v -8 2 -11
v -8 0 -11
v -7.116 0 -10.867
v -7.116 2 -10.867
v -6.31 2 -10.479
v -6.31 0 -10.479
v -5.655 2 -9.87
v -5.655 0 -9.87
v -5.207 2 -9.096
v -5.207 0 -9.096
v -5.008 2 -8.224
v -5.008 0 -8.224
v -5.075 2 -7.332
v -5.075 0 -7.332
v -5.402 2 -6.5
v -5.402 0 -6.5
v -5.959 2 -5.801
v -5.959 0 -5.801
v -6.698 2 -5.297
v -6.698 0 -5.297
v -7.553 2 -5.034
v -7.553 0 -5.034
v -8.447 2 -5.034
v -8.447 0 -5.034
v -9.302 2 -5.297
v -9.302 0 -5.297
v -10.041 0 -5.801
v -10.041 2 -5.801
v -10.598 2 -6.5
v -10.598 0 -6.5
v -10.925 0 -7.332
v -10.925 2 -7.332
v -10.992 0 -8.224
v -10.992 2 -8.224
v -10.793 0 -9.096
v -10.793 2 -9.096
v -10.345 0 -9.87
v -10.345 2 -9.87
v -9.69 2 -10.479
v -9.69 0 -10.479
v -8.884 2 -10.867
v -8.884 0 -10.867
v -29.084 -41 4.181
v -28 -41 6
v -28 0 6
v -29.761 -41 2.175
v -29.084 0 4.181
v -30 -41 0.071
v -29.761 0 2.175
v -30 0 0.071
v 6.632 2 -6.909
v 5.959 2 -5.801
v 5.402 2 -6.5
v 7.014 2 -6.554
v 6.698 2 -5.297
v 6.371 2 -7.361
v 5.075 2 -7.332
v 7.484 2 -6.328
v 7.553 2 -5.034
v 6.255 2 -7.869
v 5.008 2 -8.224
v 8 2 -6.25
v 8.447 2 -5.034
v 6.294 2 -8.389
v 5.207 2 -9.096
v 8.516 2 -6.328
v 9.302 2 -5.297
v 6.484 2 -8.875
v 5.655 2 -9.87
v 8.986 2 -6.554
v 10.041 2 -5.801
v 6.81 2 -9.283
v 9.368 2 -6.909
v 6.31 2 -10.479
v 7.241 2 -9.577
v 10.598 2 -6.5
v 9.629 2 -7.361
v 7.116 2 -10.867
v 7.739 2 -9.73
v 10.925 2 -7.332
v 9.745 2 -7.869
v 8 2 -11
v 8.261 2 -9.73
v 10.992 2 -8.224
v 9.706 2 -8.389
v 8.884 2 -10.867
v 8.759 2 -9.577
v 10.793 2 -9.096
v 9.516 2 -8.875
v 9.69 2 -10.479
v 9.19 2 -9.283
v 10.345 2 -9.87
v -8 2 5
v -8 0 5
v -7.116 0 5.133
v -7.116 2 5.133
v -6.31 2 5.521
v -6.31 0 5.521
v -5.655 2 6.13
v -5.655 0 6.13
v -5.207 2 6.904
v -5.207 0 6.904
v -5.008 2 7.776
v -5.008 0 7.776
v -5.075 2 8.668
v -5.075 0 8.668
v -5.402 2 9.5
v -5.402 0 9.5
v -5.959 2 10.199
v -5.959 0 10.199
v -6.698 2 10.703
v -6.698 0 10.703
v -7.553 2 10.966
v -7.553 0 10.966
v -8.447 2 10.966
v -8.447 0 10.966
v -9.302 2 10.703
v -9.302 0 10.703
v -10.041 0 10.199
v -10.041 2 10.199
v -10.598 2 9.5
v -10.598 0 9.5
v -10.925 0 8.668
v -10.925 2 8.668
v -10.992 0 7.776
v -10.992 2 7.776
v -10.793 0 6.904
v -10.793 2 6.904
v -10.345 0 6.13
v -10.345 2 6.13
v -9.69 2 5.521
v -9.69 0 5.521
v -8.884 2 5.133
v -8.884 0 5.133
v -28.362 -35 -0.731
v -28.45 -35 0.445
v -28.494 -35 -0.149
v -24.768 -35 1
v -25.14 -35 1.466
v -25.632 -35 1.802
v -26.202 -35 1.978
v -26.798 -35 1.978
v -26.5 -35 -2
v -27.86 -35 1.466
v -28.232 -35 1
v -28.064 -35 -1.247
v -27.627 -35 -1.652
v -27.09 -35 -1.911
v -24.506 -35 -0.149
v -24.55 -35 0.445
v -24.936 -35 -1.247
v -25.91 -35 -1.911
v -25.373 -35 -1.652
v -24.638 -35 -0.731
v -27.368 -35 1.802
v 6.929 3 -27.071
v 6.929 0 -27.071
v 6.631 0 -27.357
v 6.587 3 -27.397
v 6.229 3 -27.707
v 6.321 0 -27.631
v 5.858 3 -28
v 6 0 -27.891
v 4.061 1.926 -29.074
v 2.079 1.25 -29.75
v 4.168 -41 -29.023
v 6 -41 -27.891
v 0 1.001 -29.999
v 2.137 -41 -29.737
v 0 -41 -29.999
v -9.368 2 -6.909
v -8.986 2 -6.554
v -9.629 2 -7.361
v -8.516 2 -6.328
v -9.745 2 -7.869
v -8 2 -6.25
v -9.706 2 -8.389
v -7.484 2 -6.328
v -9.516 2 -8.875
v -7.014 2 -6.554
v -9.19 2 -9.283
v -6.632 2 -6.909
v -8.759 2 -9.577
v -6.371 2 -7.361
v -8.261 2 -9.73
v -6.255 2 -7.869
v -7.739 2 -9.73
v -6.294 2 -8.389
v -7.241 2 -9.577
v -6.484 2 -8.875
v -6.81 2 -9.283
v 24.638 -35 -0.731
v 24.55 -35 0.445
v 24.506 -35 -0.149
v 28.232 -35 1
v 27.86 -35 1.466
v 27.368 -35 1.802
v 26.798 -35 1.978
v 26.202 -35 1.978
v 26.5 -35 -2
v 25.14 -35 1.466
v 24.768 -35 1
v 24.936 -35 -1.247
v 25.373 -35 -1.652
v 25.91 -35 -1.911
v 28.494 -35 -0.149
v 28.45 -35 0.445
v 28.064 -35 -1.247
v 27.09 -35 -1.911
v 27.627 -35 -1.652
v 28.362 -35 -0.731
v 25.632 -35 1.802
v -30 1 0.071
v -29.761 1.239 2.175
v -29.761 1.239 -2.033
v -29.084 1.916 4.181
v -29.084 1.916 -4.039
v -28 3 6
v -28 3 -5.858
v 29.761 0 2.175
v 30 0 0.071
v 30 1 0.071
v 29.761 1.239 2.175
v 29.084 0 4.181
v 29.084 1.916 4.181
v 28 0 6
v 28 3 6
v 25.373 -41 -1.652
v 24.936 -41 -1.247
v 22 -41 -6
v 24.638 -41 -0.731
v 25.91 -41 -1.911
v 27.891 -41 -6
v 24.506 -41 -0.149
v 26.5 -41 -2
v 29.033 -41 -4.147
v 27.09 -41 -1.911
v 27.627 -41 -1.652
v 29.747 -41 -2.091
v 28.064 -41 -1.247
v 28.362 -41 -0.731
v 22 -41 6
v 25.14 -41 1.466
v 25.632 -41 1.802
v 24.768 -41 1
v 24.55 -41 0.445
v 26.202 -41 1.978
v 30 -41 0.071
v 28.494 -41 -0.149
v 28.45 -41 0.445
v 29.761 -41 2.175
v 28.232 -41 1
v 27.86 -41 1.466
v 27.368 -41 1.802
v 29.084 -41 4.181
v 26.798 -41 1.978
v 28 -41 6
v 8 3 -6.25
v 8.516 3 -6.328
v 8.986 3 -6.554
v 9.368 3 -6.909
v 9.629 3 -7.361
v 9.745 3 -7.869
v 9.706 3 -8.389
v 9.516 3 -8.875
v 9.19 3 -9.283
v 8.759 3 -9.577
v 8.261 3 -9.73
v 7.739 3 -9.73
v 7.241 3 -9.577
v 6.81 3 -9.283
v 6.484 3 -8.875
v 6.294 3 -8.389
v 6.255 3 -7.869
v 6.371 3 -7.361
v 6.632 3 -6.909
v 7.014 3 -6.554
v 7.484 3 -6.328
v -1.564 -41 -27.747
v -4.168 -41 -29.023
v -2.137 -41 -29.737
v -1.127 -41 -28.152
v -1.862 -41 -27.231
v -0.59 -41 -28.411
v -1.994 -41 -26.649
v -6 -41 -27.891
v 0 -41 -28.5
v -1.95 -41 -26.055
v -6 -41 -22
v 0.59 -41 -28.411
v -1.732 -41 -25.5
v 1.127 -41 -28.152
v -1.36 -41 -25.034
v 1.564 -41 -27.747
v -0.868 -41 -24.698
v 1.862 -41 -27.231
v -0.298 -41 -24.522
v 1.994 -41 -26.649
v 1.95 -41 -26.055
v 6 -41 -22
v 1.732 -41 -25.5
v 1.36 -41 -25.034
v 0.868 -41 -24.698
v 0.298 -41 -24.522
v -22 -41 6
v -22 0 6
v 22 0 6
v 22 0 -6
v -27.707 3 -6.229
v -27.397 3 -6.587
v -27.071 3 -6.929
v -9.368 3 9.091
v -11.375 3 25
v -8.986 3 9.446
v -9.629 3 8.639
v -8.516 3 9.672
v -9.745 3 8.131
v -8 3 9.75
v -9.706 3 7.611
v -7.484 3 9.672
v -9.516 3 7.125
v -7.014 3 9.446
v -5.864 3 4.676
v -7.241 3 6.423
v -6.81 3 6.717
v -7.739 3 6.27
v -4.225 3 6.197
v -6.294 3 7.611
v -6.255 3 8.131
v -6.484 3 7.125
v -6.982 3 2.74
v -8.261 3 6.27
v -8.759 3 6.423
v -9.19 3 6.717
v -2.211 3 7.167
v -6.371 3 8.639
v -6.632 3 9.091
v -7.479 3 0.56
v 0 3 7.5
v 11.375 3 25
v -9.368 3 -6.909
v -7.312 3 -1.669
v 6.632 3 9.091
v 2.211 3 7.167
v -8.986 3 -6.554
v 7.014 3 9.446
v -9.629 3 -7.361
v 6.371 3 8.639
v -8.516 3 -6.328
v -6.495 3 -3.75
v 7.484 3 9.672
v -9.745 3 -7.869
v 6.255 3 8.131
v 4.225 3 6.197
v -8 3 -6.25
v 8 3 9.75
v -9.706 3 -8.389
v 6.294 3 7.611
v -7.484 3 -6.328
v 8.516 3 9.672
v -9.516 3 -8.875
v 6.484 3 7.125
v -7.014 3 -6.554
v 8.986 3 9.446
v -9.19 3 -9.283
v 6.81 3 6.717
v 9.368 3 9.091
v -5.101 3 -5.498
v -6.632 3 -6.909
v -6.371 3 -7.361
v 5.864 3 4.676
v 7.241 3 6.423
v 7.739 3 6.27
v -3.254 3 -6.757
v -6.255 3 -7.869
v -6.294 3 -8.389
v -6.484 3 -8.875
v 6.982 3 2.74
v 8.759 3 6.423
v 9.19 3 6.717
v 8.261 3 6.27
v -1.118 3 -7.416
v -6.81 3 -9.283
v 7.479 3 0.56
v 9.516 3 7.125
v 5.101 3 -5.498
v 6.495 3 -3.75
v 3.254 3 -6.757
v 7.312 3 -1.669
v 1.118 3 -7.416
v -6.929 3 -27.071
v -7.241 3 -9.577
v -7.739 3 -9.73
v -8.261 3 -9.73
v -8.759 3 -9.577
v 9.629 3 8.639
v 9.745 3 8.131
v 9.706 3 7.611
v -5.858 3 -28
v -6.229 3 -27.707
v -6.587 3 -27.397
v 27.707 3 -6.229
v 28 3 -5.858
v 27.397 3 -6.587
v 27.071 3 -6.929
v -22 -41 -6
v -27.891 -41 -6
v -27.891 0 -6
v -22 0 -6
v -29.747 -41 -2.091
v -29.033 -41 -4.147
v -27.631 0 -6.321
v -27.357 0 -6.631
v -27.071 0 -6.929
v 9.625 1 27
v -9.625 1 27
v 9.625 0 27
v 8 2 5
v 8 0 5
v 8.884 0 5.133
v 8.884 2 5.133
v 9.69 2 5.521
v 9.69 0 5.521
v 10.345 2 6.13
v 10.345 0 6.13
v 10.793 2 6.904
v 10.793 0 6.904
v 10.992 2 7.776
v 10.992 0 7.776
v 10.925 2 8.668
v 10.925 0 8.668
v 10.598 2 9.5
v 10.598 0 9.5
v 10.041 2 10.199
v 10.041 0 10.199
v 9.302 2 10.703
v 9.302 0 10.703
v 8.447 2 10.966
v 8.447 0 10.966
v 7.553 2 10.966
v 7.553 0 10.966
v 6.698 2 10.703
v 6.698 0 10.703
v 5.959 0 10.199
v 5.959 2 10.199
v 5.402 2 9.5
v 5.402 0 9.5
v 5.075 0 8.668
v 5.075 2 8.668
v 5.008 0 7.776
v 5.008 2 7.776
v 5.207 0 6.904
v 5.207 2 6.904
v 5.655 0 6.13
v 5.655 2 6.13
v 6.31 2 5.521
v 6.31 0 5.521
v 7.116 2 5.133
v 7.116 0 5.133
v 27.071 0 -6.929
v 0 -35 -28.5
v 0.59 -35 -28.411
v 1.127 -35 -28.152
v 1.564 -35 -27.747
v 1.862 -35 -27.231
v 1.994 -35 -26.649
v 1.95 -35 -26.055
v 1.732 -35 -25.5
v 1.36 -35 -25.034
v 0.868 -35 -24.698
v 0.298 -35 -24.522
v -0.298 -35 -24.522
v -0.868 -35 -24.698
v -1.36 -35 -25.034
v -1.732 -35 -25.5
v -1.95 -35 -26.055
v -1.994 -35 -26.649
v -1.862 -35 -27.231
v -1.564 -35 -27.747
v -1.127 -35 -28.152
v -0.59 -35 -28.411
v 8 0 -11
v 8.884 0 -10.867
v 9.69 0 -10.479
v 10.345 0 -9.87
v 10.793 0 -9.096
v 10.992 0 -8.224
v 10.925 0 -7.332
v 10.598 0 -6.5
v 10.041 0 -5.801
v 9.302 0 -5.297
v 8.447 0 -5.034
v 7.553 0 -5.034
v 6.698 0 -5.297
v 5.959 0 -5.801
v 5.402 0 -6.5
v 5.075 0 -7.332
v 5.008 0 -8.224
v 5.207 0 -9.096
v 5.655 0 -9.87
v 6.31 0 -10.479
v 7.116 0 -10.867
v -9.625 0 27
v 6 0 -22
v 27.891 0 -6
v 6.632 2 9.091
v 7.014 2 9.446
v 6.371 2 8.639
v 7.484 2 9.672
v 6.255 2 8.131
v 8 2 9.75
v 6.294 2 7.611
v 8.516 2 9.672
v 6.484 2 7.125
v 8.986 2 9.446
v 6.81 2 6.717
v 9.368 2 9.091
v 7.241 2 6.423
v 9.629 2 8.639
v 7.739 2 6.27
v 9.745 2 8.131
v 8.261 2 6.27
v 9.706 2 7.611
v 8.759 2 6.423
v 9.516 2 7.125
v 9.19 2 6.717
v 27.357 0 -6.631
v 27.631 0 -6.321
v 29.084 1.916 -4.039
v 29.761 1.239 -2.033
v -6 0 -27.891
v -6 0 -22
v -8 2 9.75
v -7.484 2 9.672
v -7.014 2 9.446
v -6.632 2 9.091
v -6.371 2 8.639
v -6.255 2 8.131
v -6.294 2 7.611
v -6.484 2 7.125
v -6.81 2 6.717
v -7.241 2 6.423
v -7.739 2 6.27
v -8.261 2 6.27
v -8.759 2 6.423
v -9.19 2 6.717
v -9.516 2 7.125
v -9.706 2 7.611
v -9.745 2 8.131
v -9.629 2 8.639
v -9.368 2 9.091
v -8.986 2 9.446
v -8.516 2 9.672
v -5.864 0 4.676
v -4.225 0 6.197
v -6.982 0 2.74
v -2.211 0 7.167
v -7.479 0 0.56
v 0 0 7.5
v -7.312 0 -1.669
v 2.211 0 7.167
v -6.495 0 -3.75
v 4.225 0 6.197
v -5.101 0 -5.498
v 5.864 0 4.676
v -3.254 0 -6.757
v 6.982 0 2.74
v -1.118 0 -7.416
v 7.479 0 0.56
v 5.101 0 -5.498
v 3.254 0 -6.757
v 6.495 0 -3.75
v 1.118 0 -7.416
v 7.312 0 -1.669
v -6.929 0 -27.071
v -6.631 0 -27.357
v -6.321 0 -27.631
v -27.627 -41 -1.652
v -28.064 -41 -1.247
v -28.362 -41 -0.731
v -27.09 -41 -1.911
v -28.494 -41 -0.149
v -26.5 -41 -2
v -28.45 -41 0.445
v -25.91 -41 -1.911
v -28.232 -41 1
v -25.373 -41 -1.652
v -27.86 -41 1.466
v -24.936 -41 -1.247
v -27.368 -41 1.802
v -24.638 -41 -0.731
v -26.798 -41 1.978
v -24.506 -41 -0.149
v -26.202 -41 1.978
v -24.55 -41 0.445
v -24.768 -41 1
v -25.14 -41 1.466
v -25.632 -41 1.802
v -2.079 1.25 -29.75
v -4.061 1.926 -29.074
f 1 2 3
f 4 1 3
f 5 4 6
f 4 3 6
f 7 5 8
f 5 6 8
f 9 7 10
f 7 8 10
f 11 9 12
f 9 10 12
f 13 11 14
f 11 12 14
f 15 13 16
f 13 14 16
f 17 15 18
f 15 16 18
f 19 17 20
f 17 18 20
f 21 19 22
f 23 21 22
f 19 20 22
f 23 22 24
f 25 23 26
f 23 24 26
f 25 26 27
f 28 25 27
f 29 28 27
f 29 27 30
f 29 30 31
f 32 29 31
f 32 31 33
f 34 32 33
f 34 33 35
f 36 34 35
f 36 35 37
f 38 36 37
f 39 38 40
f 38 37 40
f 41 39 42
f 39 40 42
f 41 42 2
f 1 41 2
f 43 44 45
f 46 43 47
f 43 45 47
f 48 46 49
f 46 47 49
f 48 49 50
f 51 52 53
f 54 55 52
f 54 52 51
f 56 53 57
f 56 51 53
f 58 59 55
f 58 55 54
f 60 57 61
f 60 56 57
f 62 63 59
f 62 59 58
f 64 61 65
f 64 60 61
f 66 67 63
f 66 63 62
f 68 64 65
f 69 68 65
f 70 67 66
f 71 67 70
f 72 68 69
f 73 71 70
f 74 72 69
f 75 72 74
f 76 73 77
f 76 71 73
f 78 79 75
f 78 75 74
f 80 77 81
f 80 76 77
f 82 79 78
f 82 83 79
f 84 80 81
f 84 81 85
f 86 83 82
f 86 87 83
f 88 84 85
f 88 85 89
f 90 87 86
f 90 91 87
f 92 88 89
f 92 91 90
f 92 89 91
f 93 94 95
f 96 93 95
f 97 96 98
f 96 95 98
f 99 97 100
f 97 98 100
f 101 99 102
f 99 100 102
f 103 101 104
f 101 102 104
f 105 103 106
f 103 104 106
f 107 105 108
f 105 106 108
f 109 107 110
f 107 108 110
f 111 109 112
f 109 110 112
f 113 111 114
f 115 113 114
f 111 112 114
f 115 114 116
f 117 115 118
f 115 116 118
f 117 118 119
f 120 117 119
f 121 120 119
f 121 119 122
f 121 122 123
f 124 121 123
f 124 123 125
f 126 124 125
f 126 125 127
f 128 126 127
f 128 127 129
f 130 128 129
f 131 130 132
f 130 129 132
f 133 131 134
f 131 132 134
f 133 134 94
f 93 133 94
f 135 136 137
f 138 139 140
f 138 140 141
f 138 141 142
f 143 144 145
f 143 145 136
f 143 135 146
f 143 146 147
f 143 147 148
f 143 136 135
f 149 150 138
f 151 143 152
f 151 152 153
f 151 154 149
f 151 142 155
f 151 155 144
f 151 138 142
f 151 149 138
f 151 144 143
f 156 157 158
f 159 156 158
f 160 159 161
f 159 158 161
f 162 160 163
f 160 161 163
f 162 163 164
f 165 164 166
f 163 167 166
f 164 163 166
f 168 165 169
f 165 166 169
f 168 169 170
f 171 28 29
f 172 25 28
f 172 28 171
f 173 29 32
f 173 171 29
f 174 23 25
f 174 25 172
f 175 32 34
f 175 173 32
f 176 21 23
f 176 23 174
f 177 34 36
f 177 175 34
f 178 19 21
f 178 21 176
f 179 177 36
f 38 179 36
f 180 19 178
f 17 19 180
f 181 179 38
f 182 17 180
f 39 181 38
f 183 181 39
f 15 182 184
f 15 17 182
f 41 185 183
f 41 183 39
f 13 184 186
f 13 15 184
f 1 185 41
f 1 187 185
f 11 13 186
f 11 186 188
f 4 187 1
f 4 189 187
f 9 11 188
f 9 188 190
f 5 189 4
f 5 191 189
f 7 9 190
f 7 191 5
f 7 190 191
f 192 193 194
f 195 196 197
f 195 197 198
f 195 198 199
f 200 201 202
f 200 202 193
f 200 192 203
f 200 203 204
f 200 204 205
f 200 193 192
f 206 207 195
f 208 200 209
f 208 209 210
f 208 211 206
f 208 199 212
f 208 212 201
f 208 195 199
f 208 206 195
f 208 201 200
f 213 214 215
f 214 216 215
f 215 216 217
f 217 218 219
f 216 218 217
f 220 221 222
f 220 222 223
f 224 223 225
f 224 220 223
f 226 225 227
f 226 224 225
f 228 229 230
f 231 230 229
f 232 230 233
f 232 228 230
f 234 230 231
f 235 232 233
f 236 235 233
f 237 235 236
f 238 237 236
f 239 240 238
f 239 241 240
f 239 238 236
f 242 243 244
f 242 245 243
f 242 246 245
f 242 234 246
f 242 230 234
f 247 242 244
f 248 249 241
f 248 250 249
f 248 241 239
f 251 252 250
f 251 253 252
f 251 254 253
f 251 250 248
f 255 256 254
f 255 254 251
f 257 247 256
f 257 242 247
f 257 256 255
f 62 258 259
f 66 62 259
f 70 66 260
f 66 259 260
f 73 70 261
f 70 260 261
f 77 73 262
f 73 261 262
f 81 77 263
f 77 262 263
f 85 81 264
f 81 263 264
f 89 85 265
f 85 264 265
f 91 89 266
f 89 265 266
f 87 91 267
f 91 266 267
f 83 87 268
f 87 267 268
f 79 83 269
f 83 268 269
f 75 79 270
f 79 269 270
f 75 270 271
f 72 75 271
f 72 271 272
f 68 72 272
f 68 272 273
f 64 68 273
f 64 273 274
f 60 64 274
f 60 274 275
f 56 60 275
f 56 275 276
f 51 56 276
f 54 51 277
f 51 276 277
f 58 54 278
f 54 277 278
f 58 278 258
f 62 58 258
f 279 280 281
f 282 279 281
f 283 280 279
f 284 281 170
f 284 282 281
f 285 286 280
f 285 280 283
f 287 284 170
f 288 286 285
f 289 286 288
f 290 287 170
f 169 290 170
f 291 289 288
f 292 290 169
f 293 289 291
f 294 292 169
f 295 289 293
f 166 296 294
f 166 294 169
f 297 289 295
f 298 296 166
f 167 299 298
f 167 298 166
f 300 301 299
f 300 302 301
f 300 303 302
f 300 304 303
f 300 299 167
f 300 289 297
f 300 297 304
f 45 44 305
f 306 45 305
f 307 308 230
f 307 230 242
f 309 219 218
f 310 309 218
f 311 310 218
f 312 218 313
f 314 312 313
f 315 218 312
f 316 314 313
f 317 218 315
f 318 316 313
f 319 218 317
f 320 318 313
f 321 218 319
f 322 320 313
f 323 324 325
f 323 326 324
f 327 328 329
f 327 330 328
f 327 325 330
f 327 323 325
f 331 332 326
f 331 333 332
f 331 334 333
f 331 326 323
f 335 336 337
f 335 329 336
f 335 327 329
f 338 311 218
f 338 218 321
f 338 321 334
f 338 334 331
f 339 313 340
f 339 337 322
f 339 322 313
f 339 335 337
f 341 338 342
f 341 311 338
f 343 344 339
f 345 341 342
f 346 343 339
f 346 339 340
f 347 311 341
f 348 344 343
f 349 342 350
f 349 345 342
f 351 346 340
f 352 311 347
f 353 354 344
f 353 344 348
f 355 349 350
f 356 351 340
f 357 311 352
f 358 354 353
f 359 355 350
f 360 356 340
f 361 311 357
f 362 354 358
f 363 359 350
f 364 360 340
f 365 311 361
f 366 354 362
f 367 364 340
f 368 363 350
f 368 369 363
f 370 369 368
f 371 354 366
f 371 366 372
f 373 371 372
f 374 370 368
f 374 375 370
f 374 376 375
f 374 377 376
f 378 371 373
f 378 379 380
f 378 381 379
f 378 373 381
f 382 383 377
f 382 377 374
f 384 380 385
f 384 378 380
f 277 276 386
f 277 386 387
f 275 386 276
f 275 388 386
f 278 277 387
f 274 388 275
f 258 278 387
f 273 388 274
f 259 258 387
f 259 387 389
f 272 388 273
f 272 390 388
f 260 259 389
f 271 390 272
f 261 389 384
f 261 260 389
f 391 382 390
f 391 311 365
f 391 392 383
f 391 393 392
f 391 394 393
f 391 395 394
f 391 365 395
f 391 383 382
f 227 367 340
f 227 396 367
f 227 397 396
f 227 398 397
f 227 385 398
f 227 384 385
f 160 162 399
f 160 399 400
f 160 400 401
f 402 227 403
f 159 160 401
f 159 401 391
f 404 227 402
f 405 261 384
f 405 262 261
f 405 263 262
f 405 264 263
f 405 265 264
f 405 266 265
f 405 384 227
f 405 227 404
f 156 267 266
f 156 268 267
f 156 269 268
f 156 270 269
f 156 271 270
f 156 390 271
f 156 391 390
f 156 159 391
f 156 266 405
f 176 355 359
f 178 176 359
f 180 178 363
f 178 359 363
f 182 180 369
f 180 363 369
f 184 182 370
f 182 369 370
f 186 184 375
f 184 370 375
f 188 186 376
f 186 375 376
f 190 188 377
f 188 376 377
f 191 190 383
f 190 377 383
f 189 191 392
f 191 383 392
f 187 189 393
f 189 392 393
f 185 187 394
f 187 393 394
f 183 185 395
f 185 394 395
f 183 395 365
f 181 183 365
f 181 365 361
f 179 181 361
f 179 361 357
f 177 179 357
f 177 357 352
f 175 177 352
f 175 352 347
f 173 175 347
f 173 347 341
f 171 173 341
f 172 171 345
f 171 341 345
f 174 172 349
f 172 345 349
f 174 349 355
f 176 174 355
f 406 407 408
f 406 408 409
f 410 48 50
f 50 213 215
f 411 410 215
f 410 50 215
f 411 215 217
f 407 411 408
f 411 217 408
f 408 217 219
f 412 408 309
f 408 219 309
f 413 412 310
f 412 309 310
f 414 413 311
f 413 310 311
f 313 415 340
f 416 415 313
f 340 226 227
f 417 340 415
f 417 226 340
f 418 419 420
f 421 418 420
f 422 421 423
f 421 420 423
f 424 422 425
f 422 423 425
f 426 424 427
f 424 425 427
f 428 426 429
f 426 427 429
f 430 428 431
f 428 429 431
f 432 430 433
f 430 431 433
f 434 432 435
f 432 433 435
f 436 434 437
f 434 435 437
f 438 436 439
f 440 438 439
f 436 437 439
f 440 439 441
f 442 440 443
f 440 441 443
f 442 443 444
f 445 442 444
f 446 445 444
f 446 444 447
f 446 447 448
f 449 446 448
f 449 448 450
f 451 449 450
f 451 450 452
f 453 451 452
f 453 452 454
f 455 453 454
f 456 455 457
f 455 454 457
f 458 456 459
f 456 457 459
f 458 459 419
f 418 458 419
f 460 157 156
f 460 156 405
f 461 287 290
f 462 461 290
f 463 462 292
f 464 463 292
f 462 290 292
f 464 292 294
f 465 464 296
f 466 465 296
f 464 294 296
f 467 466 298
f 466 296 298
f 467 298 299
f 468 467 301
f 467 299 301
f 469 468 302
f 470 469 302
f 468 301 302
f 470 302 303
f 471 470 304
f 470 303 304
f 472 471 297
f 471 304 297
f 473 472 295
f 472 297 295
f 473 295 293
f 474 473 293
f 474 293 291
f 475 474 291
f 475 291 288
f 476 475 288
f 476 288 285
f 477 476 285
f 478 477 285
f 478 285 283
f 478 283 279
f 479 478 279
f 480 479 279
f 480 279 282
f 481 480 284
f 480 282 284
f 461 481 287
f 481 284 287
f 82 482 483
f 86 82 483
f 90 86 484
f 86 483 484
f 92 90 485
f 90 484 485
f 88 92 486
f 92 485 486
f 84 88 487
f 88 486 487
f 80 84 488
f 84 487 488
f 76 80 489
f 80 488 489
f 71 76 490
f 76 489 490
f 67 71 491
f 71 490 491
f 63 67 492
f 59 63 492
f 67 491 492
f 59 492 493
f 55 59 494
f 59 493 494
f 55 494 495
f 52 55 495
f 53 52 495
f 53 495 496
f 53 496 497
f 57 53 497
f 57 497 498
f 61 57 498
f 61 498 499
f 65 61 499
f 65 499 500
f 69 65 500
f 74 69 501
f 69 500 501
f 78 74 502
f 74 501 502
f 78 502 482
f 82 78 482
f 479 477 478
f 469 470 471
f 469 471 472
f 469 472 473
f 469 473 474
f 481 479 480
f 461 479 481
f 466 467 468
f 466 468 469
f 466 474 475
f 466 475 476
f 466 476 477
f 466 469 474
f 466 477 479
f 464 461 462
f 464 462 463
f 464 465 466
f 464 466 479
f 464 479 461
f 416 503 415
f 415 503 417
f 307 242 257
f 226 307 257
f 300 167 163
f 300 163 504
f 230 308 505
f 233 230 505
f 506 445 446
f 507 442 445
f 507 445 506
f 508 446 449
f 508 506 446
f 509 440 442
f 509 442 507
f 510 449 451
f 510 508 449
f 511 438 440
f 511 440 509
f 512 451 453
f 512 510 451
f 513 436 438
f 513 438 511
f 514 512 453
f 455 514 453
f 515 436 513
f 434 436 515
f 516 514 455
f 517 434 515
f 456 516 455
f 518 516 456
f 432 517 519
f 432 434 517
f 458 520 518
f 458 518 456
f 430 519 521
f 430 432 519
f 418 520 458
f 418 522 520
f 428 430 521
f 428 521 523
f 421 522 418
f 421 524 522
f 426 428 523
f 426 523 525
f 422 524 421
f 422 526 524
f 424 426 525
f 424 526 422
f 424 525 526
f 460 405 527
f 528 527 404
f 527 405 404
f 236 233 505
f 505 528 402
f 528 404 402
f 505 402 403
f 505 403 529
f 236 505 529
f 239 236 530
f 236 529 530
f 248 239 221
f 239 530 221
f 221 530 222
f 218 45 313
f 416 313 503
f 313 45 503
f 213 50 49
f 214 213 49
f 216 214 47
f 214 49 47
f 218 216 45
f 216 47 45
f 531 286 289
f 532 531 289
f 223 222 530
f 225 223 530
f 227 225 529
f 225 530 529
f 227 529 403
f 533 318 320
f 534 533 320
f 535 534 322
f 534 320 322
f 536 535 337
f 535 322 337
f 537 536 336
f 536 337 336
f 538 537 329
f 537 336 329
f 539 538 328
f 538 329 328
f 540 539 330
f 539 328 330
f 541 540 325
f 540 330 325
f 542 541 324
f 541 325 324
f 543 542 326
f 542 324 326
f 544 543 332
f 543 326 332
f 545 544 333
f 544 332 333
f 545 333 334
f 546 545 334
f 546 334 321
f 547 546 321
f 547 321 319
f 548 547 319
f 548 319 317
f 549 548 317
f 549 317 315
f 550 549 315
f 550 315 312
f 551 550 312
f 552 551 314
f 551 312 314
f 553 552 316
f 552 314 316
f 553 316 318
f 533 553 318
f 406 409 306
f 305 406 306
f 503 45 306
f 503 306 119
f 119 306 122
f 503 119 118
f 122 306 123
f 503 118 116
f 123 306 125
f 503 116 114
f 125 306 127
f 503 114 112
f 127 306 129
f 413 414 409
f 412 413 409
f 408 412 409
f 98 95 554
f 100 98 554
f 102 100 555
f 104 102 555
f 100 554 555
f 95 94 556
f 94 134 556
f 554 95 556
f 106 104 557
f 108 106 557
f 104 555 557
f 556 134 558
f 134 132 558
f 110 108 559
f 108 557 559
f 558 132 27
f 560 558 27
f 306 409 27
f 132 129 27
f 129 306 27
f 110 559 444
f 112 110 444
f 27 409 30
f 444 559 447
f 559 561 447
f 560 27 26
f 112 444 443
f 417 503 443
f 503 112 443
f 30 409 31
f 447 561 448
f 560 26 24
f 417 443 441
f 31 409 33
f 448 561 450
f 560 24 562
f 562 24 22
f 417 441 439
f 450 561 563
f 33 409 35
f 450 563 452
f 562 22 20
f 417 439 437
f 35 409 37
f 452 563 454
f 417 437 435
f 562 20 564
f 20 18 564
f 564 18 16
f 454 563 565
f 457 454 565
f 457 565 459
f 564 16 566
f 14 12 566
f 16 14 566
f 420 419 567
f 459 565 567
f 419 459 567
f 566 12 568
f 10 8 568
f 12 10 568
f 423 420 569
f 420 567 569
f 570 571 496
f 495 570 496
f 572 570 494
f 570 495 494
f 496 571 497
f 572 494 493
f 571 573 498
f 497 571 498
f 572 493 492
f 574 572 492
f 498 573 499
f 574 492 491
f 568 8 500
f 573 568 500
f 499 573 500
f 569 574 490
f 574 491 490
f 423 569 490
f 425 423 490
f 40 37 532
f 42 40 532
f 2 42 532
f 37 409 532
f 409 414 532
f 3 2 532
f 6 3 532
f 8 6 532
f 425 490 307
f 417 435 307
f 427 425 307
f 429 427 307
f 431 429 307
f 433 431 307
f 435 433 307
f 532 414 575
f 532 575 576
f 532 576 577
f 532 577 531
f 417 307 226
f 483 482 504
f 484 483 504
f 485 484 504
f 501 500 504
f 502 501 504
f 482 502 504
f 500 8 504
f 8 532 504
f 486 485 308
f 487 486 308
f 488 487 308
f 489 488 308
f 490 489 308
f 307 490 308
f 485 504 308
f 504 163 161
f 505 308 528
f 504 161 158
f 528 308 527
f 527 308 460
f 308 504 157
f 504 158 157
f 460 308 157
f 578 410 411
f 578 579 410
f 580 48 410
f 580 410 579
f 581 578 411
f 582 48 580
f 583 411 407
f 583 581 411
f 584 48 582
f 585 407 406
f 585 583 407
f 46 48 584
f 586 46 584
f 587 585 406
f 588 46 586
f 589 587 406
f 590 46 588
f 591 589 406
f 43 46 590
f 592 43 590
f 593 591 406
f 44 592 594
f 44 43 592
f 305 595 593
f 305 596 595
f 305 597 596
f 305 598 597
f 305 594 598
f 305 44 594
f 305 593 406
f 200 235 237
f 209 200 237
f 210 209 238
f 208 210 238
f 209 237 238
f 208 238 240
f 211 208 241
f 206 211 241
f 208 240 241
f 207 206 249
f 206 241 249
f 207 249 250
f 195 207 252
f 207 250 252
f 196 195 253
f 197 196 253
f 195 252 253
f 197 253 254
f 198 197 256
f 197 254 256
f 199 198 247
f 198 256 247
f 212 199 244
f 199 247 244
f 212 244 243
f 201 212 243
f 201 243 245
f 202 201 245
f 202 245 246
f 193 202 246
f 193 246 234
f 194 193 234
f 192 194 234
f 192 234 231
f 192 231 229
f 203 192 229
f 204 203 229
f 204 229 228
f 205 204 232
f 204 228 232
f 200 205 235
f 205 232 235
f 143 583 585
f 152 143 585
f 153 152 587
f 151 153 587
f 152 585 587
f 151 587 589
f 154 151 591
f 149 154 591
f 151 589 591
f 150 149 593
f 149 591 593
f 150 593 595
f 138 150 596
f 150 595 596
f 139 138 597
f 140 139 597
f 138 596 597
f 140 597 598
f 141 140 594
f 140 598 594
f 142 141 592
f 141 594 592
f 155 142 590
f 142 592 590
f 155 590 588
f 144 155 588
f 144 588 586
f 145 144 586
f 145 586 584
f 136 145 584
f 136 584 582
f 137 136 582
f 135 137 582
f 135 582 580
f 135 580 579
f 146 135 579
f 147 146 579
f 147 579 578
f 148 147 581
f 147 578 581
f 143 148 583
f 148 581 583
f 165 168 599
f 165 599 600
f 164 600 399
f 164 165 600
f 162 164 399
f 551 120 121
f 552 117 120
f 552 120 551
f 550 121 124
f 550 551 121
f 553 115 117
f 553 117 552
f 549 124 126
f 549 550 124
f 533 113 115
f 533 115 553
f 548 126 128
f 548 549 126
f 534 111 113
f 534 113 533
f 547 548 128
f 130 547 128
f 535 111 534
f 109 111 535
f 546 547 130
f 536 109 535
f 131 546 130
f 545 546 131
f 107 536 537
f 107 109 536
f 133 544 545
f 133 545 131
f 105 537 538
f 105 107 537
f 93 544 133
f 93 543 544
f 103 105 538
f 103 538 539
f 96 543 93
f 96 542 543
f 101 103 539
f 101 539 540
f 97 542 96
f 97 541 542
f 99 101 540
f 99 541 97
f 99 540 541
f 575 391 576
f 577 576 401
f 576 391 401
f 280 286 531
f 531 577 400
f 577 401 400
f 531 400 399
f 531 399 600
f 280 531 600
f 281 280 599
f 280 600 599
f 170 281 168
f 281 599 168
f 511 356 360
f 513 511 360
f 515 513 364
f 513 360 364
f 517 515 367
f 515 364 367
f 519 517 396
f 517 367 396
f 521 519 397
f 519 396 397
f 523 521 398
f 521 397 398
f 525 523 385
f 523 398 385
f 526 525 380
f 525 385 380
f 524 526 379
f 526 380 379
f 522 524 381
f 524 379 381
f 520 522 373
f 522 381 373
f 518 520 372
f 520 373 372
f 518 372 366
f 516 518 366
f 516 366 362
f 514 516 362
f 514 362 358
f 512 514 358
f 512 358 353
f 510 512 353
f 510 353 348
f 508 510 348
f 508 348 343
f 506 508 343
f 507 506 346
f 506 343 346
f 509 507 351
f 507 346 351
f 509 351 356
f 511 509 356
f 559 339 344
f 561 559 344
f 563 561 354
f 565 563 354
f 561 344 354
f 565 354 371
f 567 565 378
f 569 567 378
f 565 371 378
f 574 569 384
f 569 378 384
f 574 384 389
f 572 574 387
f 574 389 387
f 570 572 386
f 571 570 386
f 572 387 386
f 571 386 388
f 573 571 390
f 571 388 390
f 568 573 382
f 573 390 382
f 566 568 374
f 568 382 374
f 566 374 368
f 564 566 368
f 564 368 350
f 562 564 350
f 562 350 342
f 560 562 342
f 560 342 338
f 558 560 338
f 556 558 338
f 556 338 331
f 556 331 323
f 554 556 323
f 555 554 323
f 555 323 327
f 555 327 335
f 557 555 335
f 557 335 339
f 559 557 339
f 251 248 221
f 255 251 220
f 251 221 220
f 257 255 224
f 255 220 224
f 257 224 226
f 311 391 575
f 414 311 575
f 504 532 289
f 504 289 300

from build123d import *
from build123d.topology import SkipClean

# Parameters (mm, degrees)
SKETCH1_W           = 60
SKETCH1_H           = 60
BOSS_EXTRUDE1_DEPTH = 3
SKETCH4_W           = 8
SKETCH4_H           = 12
SKETCH4_W_2         = 12
SKETCH4_H_2         = 8
BOSS_EXTRUDE3_DEPTH = 41
SKETCH5_R           = 2
CUT_EXTRUDE2_DEPTH  = 6
SKETCH8_R           = 7.5
CUT_EXTRUDE4_DEPTH  = 6
CUT_EXTRUDE5_DEPTH  = 6
CUT_EXTRUDE6_DEPTH  = 6
SKETCH11_W          = 23.25
SKETCH11_H          = 3
CUT_EXTRUDE7_DEPTH  = 6
SKETCH12_R          = 3
CUT_EXTRUDE8_DEPTH  = 2
SKETCH13_R          = 1.75
CUT_EXTRUDE9_DEPTH  = 1
CHAMFER1_SIZE       = 2
CHAMFER2_SIZE       = 2
CHAMFER3_SIZE       = 2
CUT_EXTRUDE10_DEPTH = 10
FILLET1_R           = 10
CUT_EXTRUDE11_DEPTH = 59.999486357


with BuildPart() as part:
    # Sketch1 → Boss-Extrude1 (new body)
    with BuildSketch(Plane(origin=(0, 0, 0), x_dir=(1, 0, 0), z_dir=(0, 1, 0))):
        Rectangle(SKETCH1_W, SKETCH1_H)
    extrude(amount=BOSS_EXTRUDE1_DEPTH)

    # Sketch4 → Boss-Extrude3 (add)
    with BuildSketch(Plane.XZ):
        with Locations((-26, 0)):
            Rectangle(SKETCH4_W, SKETCH4_H)
        with Locations((0, -26)):
            Rectangle(SKETCH4_W_2, SKETCH4_H_2)
        with Locations((26, 0)):
            Rectangle(SKETCH4_W, SKETCH4_H)
    extrude(amount=BOSS_EXTRUDE3_DEPTH)

    # Sketch5 → Cut-Extrude2 (cut)
    with BuildSketch(Plane.XZ.offset(41)):
        with Locations(Location((0, -26.5, 0), (0, 0, 270))):
            Circle(SKETCH5_R)
        with Locations(Location((-26.5, 0, 0), (0, 0, 270))):
            Circle(SKETCH5_R)
        with Locations(Location((26.5, 0, 0), (0, 0, 270))):
            Circle(SKETCH5_R)
    extrude(amount=-CUT_EXTRUDE2_DEPTH, mode=Mode.SUBTRACT)

    # Sketch8 → Cut-Extrude4 (cut)
    with BuildSketch(Plane(origin=(0, 3, 0), x_dir=(1, 0, 0), z_dir=(0, 1, 0))):
        with Locations(Location((0, 0, 0), (0, 0, 270))):
            Circle(SKETCH8_R)
    extrude(amount=-CUT_EXTRUDE4_DEPTH, mode=Mode.SUBTRACT)

    # Sketch7 → Cut-Extrude5 (cut)
    with BuildSketch(Plane.XZ):
        Polygon((-30, -6), (-6, -30), (-30, -30), align=None)
        Polygon((30, -6), (6, -30), (30, -30), align=None)
    extrude(amount=-CUT_EXTRUDE5_DEPTH, mode=Mode.SUBTRACT)

    # Sketch10 → Cut-Extrude6 (cut)
    with BuildSketch(Plane.XZ):
        Polygon((-9, 30), (-30, 6), (-30, 30), align=None)
        Polygon((9, 30), (30, 6), (30, 30), align=None)
    extrude(amount=-CUT_EXTRUDE6_DEPTH, mode=Mode.SUBTRACT)

    # Sketch11 → Cut-Extrude7 (cut)
    with BuildSketch(Plane.XZ):
        with Locations((0, 28.5)):
            Rectangle(SKETCH11_W, SKETCH11_H)
    extrude(amount=-CUT_EXTRUDE7_DEPTH, mode=Mode.SUBTRACT)

    # Sketch12 → Cut-Extrude8 (cut)
    with BuildSketch(Plane.XZ):
        with Locations(Location((-8, 8, 0), (0, 0, 270))):
            Circle(SKETCH12_R)
        with Locations(Location((8, 8, 0), (0, 0, 270))):
            Circle(SKETCH12_R)
        with Locations(Location((8, -8, 0), (0, 0, 270))):
            Circle(SKETCH12_R)
        with Locations(Location((-8, -8, 0), (0, 0, 270))):
            Circle(SKETCH12_R)
    extrude(amount=-CUT_EXTRUDE8_DEPTH, mode=Mode.SUBTRACT)

    # Sketch13 → Cut-Extrude9 (cut)
    with BuildSketch(Plane(origin=(0, 3, 0), x_dir=(1, 0, 0), z_dir=(0, 1, 0))):
        with Locations(Location((-8, 8, 0), (0, 0, 270))):
            Circle(SKETCH13_R)
        with Locations(Location((8, 8, 0), (0, 0, 270))):
            Circle(SKETCH13_R)
        with Locations(Location((8, -8, 0), (0, 0, 270))):
            Circle(SKETCH13_R)
        with Locations(Location((-8, -8, 0), (0, 0, 270))):
            Circle(SKETCH13_R)
    extrude(amount=-CUT_EXTRUDE9_DEPTH, mode=Mode.SUBTRACT)

    # Chamfer1
    chamfer1_edges = [part.edges().sort_by_distance(p)[0] for p in [
        (30, 3, 0),
        (0, 3, -30),
        (-30, 3, 0),
    ]]
    chamfer(chamfer1_edges, length=CHAMFER1_SIZE)

    # Chamfer2
    chamfer2_edges = [part.edges().sort_by_distance(p)[0] for p in [
        (0, 3, 27),
    ]]
    chamfer(chamfer2_edges, length=CHAMFER2_SIZE)

    # Chamfer3
    chamfer3_edges = [part.edges().sort_by_distance(p)[0] for p in [
        (6, -20.5, -30),
        (-6, -20.5, -30),
        (-30, -20.5, -6),
        (-30, -20.5, 6),
        (30, -20.5, 6),
        (30, -20.5, -6),
    ]]
    chamfer(chamfer3_edges, length=CHAMFER3_SIZE)

    # Sketch14 → Cut-Extrude10 (cut)
    with BuildSketch(Plane.XZ):
        Polygon((-30, -4), (-4, -30), (-6, -30), (-30, -6), align=None)
        Polygon((4, -30), (30, -4), (30, -6), (6, -30), align=None)
    extrude(amount=-CUT_EXTRUDE10_DEPTH, mode=Mode.SUBTRACT)

    # Fillet1
    # the kernel refuses this fillet: 10 mm, written as the material it takes off along each edge
    with BuildSketch(Plane(origin=(-4, 11.355339059, -30), x_dir=(1, 0, 0), z_dir=(0, -1, 0)), Plane(origin=(4, -51.355339059, -30), x_dir=(-1, 0, 0), z_dir=(0, 1, 0)), Plane(origin=(30, 11.355339059, -4), x_dir=(0, 0, 1), z_dir=(0, -1, 0))) as fillet1_piece_1:
        with BuildLine():
            CenterArc((FILLET1_R * 0.414213562373, FILLET1_R), FILLET1_R, 225, 45)
            Line((-FILLET1_R * 0.292893218813, FILLET1_R * 0.292893218813), (0, 0))
            Line((0, 0), (FILLET1_R * 0.414213562373, 0))
        make_face()
    extrude(amount=62.710678119, mode=Mode.SUBTRACT)
    with BuildSketch(Plane(origin=(-30, 0, 4), x_dir=(0, 0, -1), z_dir=(0, -1, 0))) as fillet1_piece_2:
        with BuildLine():
            CenterArc((4, 10), FILLET1_R, 233.130102354, 36.869897646)
            Line((-2, 2), (0, 0))
            Line((0, 0), (4, 0))
        make_face()
    extrude(amount=51, mode=Mode.SUBTRACT)
    with BuildSketch(Plane(origin=(-30, 11.355339059, -4), x_dir=(0, 0, 1), z_dir=(0, -1, 0))) as fillet1_piece_3:
        with BuildLine():
            CenterArc((FILLET1_R * 0.414213562373, -FILLET1_R), FILLET1_R, 90, 45)
            Line((-FILLET1_R * 0.292893218813, -FILLET1_R * 0.292893218813), (0, 0))
            Line((0, 0), (FILLET1_R * 0.414213562373, 0))
        make_face()
    extrude(amount=62.710678119, mode=Mode.SUBTRACT)
    with BuildSketch(Plane(origin=(30, 0, 4), x_dir=(0, 0, -1), z_dir=(0, -1, 0))) as fillet1_piece_4:
        with BuildLine():
            CenterArc((4, -10), FILLET1_R, 90, 36.869897646)
            Line((-2, -2), (0, 0))
            Line((0, 0), (4, 0))
        make_face()
    extrude(amount=51, mode=Mode.SUBTRACT)

    # Sketch16 → Cut-Extrude11 (cut, through all)
    with SkipClean():  # the faces are left unmerged after this step: merging them gives an invalid solid
        with BuildSketch(Plane.XZ):
            with BuildLine():
                Line((-28, 6), (-9.625, 27))
                Line((-9.625, 27), (-11.625, 27))
                Line((-11.625, 27), (-30, 6))
                Line((-30, 6), (-30, 0.142135624))
                ThreePointArc((-30, 0.142135624), (-29.999936866, 0.106601493), (-29.999747465, 0.071067812))
                ThreePointArc((-29.999747465, 0.071067812), (-29.475536208, 3.195968331), (-28, 6))
            make_face()
            with BuildLine():
                Line((28, 6), (9.625, 27))
                Line((9.625, 27), (11.625, 27))
                Line((11.625, 27), (30, 6))
                Line((30, 6), (30, 0.142135624))
                ThreePointArc((30, 0.142135624), (29.999936866, 0.106601493), (29.999747465, 0.071067812))
                ThreePointArc((29.999747465, 0.071067812), (29.475536208, 3.195968331), (28, 6))
            make_face()
        extrude(amount=-CUT_EXTRUDE11_DEPTH, mode=Mode.SUBTRACT)


solid = part.part
